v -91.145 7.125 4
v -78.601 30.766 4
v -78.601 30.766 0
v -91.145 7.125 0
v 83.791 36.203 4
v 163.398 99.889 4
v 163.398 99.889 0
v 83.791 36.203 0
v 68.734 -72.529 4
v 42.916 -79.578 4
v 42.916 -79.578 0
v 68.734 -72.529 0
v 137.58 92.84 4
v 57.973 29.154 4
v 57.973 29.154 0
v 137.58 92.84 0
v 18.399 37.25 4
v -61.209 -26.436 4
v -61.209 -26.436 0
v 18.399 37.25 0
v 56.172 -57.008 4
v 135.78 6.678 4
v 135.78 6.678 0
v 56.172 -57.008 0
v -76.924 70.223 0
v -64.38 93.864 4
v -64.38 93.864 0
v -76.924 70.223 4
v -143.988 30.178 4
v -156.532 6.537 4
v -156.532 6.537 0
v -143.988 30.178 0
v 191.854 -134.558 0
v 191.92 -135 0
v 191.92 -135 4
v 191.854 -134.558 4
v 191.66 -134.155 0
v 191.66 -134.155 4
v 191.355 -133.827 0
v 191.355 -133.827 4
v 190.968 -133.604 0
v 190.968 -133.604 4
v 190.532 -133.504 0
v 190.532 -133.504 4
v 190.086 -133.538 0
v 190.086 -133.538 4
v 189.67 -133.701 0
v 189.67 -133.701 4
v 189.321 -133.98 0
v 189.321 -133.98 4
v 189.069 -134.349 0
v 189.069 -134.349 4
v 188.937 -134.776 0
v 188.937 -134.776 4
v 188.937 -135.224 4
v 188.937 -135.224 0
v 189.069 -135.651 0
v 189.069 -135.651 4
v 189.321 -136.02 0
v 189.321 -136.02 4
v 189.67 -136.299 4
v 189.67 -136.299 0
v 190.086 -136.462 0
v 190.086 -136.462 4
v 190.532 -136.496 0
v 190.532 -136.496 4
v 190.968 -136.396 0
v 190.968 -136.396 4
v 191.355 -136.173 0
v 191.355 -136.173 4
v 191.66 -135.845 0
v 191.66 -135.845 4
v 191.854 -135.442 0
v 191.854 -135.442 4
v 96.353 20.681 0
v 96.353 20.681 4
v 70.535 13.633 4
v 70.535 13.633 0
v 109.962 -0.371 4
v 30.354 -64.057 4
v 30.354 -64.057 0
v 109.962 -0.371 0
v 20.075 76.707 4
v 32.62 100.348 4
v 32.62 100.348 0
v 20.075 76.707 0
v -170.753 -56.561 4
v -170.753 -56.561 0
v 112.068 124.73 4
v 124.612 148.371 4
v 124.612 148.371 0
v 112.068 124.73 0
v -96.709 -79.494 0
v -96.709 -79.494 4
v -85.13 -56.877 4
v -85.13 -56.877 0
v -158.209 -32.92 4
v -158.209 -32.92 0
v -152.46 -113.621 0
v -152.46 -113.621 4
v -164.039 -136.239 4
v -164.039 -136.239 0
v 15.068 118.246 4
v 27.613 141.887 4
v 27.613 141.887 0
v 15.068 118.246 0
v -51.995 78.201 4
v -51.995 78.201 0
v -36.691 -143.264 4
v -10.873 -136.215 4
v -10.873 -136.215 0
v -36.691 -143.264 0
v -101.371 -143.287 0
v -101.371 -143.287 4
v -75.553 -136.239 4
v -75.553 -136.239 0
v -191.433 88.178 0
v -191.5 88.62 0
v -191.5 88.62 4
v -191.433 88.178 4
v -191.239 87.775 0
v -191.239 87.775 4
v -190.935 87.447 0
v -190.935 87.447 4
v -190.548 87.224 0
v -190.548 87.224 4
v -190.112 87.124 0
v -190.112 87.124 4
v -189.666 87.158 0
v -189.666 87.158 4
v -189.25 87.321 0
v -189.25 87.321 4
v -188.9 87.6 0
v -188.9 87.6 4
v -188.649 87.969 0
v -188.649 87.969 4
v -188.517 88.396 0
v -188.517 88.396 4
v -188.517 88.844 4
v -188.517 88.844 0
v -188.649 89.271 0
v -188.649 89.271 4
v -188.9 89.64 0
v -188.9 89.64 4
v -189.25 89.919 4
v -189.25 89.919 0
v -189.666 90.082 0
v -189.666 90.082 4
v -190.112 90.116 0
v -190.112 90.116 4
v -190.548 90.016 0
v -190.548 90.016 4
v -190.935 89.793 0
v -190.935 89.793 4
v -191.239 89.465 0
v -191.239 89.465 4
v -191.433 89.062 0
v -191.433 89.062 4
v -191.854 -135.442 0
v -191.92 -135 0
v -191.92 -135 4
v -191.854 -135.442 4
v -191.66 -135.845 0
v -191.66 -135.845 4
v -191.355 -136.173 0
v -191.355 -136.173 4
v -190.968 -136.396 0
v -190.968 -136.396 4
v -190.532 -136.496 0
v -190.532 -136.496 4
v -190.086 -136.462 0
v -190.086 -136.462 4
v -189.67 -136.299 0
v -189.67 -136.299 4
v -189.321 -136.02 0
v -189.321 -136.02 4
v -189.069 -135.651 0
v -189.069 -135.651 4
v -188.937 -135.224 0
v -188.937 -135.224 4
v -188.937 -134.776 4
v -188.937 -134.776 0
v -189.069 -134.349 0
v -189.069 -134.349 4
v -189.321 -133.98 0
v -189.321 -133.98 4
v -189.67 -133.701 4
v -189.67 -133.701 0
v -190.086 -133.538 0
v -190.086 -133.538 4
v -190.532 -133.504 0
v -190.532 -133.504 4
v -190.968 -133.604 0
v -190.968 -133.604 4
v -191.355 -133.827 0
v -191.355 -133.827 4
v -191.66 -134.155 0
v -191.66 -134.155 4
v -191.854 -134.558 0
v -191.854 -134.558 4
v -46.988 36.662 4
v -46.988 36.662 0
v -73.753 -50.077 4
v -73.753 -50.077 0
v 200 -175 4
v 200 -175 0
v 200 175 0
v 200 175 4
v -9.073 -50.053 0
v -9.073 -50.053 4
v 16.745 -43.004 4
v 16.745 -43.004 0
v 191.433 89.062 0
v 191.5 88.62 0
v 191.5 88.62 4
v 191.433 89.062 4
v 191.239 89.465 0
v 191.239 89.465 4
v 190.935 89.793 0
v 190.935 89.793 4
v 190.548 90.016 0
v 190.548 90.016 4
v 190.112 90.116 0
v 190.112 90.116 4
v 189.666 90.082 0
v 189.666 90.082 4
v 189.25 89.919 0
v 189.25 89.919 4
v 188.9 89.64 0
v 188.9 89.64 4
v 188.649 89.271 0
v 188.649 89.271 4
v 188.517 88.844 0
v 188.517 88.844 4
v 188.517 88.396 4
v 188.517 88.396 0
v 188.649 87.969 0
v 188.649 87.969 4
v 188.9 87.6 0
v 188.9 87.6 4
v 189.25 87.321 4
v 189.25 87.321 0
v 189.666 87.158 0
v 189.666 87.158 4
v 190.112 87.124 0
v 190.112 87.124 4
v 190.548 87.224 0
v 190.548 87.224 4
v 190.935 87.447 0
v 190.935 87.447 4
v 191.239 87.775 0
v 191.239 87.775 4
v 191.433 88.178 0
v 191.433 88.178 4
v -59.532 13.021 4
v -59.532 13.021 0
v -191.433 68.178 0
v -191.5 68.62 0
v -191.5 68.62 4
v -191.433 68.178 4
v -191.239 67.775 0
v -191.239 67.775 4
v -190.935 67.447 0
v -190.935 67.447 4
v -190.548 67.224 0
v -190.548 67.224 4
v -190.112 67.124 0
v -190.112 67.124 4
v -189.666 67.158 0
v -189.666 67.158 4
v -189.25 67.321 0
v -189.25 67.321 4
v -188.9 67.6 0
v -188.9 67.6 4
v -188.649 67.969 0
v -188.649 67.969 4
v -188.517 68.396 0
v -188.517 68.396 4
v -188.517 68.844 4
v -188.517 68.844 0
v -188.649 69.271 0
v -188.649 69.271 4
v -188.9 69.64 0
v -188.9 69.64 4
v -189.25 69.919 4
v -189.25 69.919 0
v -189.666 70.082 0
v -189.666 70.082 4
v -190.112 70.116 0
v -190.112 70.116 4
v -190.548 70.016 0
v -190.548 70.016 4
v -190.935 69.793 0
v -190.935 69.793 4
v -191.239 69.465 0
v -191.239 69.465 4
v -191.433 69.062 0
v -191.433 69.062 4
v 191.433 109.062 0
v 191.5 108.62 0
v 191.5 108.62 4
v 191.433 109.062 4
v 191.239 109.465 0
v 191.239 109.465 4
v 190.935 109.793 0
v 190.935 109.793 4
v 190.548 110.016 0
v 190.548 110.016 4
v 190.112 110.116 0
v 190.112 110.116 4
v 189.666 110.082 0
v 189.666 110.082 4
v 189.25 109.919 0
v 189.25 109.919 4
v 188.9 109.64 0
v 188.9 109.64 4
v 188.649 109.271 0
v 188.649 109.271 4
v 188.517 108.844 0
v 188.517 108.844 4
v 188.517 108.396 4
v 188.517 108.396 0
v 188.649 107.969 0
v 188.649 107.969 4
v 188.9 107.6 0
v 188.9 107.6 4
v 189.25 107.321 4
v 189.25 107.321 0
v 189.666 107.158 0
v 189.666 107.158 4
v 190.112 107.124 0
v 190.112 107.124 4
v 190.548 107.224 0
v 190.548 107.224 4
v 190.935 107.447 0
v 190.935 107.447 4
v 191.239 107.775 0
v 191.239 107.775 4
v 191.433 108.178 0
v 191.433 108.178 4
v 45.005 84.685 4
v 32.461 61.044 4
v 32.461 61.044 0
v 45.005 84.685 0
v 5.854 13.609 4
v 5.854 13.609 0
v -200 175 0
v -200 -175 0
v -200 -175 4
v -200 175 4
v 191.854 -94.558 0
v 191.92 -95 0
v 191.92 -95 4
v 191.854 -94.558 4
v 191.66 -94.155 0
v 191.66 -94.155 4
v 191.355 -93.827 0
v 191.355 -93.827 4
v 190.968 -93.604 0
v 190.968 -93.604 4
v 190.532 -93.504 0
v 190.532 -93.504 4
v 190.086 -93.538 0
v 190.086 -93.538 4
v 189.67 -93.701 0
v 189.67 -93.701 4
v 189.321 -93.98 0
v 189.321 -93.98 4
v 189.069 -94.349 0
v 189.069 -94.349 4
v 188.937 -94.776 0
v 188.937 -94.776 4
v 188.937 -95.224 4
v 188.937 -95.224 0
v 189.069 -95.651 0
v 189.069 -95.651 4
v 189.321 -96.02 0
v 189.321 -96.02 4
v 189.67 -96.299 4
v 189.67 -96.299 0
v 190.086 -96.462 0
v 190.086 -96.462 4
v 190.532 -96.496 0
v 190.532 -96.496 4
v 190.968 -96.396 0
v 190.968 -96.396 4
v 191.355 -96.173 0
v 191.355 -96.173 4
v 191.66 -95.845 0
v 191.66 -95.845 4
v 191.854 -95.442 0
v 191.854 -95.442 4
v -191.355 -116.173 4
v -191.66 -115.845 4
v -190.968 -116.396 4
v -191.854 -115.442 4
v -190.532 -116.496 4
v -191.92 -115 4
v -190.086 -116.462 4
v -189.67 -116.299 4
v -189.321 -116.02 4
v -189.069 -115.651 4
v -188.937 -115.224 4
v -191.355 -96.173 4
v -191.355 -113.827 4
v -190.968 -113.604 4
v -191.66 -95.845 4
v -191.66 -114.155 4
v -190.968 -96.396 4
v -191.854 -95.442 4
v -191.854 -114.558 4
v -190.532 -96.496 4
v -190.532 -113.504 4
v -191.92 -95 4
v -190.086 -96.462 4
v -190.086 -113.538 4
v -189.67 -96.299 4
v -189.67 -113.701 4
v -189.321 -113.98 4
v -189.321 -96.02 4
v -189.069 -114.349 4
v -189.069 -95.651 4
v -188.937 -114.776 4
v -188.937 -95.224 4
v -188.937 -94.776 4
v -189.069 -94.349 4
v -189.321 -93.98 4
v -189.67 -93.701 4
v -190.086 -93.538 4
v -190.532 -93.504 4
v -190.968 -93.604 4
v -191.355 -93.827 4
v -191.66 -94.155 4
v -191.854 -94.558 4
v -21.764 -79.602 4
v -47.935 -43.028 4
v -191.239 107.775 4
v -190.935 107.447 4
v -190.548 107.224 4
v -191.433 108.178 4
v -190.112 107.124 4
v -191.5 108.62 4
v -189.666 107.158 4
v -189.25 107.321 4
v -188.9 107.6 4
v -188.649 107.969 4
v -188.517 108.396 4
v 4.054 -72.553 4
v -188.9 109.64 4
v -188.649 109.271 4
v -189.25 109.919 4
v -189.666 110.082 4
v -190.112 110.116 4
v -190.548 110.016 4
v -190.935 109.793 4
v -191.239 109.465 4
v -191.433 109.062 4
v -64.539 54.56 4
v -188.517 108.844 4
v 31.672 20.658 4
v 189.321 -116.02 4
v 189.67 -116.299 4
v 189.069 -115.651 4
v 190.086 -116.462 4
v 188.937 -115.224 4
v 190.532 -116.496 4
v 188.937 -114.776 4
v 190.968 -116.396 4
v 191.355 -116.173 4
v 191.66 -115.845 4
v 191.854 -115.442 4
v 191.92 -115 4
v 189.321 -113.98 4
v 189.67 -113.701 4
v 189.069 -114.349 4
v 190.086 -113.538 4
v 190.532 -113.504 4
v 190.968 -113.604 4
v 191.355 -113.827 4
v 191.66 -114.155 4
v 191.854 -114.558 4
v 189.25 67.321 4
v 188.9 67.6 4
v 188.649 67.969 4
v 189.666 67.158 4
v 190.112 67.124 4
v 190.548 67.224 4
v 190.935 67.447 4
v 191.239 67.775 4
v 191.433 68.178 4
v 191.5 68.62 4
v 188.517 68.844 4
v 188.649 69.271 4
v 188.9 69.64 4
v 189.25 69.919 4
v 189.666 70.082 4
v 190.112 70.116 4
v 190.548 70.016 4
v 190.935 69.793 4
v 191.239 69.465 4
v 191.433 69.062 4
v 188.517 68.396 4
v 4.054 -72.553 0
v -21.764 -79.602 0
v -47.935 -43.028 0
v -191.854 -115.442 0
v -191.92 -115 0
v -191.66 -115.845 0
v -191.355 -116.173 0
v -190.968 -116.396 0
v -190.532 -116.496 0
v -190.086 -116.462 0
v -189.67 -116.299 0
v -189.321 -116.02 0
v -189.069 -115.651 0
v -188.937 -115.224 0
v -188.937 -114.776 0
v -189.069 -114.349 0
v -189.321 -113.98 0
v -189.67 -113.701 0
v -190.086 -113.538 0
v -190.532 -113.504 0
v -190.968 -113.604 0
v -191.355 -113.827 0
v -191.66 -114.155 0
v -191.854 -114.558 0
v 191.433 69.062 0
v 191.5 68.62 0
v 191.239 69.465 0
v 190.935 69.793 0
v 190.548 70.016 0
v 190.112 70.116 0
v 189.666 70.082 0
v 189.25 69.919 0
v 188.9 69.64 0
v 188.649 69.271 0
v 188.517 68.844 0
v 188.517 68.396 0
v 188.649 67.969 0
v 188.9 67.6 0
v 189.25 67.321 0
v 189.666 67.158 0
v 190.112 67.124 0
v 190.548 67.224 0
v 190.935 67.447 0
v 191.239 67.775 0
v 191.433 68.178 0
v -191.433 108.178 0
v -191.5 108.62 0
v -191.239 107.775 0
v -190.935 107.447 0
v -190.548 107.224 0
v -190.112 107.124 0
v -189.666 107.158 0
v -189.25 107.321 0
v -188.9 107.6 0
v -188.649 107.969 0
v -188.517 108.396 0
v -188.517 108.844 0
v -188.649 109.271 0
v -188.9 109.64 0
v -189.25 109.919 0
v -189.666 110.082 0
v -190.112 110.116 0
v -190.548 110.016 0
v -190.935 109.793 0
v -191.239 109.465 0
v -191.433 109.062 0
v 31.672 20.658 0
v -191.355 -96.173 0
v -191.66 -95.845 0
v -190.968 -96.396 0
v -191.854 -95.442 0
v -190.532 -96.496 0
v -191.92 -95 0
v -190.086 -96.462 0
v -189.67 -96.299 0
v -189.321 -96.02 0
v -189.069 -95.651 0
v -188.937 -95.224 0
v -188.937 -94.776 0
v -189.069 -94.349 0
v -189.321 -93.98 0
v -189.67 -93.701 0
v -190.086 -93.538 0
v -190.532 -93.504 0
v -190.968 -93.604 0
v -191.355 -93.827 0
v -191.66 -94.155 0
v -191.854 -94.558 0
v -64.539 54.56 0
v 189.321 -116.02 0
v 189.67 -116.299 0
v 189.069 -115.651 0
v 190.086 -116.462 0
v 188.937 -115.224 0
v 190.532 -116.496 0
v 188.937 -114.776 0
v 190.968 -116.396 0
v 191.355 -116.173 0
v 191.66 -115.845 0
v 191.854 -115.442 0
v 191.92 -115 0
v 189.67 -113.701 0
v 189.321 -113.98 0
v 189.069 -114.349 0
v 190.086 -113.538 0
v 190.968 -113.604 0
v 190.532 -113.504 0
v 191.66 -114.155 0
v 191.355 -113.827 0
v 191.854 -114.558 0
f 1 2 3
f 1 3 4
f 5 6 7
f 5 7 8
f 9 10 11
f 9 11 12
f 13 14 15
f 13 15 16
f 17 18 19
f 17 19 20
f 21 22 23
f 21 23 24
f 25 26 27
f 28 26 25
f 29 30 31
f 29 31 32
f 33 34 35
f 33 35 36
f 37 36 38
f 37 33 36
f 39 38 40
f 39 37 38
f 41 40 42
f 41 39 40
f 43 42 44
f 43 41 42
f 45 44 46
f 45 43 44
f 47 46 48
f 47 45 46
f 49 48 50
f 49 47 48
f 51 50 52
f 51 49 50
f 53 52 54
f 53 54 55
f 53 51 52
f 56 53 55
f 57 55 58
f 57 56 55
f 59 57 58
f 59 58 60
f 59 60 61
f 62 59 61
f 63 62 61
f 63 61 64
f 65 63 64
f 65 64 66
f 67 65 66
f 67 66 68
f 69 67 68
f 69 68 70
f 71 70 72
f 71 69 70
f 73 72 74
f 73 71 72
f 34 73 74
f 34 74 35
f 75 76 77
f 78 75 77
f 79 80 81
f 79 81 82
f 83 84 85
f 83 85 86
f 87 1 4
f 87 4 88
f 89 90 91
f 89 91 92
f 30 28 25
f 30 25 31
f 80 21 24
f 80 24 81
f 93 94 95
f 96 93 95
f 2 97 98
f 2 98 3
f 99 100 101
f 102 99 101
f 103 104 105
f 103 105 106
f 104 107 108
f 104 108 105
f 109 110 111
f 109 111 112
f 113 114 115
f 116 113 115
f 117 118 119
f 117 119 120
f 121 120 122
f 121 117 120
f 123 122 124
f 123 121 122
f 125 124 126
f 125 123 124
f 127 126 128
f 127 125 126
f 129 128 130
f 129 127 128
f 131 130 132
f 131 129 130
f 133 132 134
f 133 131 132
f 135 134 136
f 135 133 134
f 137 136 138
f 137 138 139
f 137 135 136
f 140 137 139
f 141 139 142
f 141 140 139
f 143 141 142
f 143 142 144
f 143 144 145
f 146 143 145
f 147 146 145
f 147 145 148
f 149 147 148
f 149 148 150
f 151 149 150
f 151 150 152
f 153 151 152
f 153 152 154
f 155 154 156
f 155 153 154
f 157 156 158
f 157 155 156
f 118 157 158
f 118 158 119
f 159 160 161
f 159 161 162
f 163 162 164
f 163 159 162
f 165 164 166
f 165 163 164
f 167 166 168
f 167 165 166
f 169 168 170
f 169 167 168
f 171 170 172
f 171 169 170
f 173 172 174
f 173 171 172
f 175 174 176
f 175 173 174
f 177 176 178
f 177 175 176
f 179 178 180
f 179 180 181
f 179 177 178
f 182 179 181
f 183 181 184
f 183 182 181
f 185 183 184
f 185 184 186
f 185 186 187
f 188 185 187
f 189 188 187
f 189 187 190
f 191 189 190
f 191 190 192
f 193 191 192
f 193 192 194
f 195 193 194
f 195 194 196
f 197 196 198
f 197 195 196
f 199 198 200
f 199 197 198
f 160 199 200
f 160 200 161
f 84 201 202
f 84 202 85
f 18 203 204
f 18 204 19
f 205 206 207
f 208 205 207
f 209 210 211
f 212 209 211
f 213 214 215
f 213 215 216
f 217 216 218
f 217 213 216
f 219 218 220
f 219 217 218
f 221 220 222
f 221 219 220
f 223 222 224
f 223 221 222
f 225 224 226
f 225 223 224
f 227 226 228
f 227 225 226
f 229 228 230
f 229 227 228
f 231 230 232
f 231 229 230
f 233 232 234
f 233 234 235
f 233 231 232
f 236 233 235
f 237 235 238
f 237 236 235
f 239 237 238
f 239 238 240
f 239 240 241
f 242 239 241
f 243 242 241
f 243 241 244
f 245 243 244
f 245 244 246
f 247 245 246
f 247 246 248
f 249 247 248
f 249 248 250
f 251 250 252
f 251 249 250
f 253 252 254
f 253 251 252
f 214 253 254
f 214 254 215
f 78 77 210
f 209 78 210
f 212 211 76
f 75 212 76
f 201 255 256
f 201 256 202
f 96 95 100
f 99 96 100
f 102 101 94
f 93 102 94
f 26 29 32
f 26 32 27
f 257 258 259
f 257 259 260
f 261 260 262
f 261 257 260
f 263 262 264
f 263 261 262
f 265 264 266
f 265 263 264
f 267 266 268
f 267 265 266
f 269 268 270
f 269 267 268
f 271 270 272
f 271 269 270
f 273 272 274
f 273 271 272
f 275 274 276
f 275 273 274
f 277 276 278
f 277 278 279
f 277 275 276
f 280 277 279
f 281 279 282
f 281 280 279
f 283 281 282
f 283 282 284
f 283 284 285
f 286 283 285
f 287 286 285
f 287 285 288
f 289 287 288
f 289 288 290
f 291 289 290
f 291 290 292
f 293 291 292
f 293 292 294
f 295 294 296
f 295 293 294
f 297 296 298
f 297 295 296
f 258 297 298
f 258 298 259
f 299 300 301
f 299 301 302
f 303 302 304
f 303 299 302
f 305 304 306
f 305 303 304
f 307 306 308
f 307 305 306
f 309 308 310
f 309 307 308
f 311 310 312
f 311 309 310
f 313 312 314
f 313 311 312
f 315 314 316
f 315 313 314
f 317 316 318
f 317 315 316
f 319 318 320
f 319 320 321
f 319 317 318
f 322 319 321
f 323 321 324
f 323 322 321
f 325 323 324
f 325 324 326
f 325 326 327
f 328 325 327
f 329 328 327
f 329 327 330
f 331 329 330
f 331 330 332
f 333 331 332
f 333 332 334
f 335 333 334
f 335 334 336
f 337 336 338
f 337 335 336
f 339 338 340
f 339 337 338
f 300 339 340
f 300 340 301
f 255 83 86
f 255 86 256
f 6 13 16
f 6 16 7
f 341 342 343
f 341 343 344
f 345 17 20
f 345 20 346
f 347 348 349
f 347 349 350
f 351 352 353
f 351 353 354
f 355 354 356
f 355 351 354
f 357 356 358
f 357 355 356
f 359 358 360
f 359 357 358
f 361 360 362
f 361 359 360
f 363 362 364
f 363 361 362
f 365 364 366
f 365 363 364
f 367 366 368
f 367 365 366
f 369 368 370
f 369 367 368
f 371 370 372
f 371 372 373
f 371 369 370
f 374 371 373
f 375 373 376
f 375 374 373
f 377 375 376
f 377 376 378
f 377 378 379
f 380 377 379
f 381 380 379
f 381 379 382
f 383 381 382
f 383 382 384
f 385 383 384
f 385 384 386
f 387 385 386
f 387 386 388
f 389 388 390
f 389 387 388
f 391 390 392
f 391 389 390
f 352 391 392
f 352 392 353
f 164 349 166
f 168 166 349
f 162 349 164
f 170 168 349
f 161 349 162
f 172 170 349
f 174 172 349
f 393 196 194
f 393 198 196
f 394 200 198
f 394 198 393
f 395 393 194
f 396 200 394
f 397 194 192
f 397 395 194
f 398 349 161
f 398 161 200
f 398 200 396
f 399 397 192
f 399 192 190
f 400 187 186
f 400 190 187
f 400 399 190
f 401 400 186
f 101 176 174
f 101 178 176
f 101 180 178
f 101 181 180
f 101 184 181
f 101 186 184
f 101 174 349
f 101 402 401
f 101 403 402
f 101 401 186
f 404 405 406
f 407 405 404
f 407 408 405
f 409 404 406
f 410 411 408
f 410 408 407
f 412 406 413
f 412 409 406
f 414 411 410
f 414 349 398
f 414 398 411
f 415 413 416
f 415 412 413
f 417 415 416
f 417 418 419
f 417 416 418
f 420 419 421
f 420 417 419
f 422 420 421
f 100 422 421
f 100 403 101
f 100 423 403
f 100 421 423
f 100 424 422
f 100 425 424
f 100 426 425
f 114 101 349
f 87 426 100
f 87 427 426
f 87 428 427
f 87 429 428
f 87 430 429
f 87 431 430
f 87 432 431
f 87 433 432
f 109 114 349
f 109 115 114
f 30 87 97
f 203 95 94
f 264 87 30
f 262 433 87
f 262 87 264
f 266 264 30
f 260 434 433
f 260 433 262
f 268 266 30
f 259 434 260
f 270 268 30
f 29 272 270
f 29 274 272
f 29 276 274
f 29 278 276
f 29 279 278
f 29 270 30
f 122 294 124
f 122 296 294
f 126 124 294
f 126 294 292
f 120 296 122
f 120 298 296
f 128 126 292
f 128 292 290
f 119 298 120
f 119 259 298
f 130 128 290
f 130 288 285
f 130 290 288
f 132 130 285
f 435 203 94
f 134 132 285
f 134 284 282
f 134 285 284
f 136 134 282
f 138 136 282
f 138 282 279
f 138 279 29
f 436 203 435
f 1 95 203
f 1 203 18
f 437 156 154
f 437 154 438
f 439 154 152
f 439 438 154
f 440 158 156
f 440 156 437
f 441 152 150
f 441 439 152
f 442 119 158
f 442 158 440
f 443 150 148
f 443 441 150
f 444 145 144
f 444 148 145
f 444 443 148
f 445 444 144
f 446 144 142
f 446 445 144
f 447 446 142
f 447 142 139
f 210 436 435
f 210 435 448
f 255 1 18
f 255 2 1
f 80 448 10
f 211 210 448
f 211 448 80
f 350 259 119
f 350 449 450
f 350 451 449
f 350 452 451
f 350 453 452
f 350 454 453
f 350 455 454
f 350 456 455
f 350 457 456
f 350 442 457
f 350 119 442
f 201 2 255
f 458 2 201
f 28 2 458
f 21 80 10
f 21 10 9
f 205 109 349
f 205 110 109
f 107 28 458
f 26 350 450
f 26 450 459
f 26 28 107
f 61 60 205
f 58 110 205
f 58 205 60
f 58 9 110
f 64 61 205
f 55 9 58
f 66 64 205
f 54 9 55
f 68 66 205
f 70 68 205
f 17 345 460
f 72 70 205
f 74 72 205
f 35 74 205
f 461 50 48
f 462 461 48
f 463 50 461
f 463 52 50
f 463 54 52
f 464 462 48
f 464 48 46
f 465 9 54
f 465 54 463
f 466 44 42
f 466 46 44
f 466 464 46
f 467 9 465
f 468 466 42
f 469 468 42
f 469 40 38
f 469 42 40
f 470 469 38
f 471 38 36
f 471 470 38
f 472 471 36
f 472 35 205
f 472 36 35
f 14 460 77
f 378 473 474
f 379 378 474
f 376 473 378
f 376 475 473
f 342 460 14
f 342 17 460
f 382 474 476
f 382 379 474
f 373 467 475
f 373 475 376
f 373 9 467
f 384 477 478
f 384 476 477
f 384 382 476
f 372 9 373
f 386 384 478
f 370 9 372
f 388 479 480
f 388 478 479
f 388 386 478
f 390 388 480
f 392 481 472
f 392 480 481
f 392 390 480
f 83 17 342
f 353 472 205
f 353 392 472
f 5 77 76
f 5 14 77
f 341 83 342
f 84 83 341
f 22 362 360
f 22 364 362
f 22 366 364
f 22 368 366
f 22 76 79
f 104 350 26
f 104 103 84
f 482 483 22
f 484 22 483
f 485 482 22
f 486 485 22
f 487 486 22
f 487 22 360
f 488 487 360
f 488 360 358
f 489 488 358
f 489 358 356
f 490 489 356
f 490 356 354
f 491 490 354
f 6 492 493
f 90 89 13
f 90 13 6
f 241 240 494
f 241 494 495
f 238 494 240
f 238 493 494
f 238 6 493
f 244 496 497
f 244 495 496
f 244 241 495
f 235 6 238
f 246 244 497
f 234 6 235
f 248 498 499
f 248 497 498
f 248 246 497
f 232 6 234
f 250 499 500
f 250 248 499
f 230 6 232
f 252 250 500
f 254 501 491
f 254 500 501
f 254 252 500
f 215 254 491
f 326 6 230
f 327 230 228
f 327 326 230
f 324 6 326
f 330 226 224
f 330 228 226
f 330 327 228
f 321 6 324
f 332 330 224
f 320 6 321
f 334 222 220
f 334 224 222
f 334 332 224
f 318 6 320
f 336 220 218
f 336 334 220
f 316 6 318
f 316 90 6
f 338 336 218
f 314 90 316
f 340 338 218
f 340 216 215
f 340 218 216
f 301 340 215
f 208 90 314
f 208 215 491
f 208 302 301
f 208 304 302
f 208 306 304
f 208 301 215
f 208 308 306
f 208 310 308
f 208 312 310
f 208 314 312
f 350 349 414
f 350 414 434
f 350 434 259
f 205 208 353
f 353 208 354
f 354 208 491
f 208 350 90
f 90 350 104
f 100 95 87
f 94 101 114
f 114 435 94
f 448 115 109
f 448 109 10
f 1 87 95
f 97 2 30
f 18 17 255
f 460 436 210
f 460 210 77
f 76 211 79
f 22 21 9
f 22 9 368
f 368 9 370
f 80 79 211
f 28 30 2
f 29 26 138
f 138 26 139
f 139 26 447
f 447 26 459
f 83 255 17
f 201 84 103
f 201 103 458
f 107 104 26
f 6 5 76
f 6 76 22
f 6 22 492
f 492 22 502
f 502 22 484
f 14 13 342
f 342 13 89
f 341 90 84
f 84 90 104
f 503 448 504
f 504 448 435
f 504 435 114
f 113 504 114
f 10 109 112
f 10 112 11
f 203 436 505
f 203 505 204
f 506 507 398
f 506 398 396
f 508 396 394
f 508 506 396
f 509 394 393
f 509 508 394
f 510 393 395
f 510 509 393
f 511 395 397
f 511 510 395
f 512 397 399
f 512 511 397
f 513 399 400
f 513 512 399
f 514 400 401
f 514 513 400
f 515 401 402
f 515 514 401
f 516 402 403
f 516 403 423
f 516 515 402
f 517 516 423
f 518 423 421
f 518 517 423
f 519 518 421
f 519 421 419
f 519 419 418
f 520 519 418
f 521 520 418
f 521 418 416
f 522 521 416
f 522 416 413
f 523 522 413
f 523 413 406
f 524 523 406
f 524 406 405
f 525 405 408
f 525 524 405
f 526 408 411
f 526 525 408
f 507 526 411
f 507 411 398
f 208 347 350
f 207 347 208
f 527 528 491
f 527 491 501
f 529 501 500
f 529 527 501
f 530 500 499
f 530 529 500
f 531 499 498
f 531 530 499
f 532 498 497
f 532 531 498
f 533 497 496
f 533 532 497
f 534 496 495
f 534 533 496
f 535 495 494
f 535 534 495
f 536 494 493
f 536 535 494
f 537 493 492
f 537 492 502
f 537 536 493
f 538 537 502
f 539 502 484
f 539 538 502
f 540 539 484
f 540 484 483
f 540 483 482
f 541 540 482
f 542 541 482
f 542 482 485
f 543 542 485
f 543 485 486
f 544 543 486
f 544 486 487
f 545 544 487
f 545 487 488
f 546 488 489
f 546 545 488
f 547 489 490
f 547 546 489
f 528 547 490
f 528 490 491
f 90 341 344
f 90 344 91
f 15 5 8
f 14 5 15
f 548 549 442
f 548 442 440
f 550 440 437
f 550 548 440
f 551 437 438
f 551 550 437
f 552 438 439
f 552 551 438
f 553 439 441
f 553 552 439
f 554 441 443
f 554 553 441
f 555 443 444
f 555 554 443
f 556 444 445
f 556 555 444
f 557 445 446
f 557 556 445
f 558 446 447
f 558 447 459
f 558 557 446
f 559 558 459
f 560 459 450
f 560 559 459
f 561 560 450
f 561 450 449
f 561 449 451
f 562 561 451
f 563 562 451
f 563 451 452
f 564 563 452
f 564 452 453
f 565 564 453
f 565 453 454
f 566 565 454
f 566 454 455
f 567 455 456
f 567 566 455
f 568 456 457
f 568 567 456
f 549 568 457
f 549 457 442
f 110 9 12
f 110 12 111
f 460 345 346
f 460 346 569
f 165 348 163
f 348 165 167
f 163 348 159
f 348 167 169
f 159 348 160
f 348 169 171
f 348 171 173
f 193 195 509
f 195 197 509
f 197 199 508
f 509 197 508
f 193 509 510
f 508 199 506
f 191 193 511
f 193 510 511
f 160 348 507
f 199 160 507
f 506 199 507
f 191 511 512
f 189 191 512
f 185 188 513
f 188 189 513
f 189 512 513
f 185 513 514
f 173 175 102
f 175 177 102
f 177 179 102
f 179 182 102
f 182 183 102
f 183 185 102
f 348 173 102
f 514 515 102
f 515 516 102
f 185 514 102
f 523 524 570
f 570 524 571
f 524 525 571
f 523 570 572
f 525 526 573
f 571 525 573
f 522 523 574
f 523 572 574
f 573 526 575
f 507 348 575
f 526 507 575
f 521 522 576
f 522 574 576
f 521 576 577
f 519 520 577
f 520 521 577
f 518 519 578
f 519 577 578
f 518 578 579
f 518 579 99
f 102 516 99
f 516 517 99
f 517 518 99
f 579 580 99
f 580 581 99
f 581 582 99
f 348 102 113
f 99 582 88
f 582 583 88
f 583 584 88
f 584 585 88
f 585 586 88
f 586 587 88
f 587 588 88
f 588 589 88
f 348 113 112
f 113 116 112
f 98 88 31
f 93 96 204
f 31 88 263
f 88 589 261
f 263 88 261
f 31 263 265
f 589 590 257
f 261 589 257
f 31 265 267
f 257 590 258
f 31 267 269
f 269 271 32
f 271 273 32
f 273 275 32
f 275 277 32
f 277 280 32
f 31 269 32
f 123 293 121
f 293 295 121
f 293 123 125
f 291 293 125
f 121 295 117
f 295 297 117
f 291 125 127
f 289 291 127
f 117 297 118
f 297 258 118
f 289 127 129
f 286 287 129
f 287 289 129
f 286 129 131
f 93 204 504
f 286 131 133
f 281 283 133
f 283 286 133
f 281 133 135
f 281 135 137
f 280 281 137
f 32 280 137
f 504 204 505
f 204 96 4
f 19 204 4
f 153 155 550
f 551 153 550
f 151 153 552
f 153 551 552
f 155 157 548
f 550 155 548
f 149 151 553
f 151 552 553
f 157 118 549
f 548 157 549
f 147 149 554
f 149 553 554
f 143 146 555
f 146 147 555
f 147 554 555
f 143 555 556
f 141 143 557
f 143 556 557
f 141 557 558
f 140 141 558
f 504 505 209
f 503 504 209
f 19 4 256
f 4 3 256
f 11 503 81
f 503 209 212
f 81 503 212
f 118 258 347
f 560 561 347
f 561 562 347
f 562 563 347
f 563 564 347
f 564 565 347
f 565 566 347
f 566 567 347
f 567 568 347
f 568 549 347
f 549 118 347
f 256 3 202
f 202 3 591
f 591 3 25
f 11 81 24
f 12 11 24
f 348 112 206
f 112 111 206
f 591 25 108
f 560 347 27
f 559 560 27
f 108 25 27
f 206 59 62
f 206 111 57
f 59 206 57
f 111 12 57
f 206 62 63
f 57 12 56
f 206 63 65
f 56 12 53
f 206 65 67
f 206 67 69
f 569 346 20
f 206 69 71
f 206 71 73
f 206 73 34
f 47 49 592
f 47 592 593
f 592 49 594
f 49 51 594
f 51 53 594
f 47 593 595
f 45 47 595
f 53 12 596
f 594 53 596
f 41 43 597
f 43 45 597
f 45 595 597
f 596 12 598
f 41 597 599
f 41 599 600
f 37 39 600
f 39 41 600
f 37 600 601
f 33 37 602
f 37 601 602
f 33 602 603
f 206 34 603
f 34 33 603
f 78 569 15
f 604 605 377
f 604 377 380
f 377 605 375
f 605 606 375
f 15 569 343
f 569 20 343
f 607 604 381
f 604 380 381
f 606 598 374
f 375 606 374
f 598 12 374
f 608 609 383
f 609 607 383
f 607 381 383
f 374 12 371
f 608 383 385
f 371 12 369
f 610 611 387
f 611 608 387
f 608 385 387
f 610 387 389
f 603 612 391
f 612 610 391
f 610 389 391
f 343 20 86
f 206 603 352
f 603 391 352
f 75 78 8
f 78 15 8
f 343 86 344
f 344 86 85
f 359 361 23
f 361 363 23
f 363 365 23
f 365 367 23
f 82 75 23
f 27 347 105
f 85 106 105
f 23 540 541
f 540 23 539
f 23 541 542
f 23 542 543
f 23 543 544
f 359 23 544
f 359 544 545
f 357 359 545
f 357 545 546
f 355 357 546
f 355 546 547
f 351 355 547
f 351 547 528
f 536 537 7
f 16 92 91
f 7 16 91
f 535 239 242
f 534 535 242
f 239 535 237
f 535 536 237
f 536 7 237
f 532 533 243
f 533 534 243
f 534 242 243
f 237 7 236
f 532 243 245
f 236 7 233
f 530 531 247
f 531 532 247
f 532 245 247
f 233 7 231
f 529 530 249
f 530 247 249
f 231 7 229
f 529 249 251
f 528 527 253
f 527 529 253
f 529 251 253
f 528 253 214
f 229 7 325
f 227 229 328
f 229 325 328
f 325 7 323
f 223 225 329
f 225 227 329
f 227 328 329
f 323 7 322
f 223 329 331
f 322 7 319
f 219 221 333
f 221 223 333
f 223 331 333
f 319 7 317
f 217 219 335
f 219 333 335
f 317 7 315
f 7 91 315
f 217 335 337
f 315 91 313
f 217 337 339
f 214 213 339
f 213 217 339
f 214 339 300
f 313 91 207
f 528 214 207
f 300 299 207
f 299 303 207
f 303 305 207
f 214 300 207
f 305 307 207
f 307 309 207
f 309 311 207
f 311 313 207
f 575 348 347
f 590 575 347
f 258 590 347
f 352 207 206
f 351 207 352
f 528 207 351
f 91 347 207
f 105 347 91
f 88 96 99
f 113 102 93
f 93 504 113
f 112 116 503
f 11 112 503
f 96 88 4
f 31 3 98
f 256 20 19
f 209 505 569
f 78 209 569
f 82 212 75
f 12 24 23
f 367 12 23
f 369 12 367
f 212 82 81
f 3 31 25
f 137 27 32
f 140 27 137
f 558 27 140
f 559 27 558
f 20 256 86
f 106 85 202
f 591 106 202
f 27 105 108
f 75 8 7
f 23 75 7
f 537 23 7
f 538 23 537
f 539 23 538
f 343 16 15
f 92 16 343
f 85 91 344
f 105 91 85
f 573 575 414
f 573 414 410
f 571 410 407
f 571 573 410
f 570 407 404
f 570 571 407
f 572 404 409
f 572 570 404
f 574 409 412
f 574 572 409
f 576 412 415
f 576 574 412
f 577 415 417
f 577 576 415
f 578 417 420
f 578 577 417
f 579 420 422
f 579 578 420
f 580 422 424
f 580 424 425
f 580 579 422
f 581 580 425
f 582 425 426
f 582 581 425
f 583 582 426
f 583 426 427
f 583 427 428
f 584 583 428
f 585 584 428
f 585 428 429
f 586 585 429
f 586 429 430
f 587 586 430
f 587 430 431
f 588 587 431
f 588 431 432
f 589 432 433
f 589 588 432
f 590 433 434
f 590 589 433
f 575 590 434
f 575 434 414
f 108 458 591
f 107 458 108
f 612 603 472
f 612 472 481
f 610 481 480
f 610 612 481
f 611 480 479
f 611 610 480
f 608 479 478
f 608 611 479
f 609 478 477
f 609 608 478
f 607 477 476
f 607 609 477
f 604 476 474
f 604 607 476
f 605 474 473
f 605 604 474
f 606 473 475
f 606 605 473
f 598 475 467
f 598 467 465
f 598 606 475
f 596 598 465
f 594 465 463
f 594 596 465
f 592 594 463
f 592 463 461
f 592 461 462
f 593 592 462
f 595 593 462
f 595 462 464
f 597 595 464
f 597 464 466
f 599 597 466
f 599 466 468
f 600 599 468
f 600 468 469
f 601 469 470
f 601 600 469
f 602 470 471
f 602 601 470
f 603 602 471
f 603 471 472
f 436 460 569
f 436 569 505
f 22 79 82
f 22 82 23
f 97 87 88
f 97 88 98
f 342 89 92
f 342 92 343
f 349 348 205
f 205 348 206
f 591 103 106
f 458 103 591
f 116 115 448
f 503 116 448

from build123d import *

# Parameters (mm, degrees)
SKETCH1_W           = 400
SKETCH1_H           = 350
SKETCH1_R           = 1.5
BOSS_EXTRUDE1_DEPTH = 4
CUT_EXTRUDE1_DEPTH  = 10


with BuildPart() as part:
    # Sketch1 → Boss-Extrude1 (new body)
    with BuildSketch(Plane.XY):
        Rectangle(SKETCH1_W, SKETCH1_H)
        with Locations((190.420210886, -135)):
            Circle(SKETCH1_R, mode=Mode.SUBTRACT)
        with Locations((190.420210886, -115)):
            Circle(SKETCH1_R, mode=Mode.SUBTRACT)
        with Locations((190.420210886, -95)):
            Circle(SKETCH1_R, mode=Mode.SUBTRACT)
        with Locations((190, 68.62)):
            Circle(SKETCH1_R, mode=Mode.SUBTRACT)
        with Locations((190, 88.62)):
            Circle(SKETCH1_R, mode=Mode.SUBTRACT)
        with Locations((190, 108.62)):
            Circle(SKETCH1_R, mode=Mode.SUBTRACT)
        with Locations(Location((-190.420210886, -135, 0), (0, 0, 180))):
            Circle(SKETCH1_R, mode=Mode.SUBTRACT)
        with Locations(Location((-190.420210886, -95, 0), (0, 0, 180))):
            Circle(SKETCH1_R, mode=Mode.SUBTRACT)
        with Locations(Location((-190.420210886, -115, 0), (0, 0, 180))):
            Circle(SKETCH1_R, mode=Mode.SUBTRACT)
        with Locations(Location((-190, 68.62, 0), (0, 0, 180))):
            Circle(SKETCH1_R, mode=Mode.SUBTRACT)
        with Locations(Location((-190, 88.62, 0), (0, 0, 180))):
            Circle(SKETCH1_R, mode=Mode.SUBTRACT)
        with Locations(Location((-190, 108.62, 0), (0, 0, 180))):
            Circle(SKETCH1_R, mode=Mode.SUBTRACT)
    extrude(amount=BOSS_EXTRUDE1_DEPTH)

    # Sketch2 → Cut-Extrude1 (cut)
    with BuildSketch(Plane.XY.offset(4)):
        Polygon((-76.924392285, 70.222779709), (-156.531783107, 6.536867051), (-143.98758819, 30.17784978), (-64.380197367, 93.863762438), align=None)
        Polygon((15.0683317, 118.246100027), (-64.539059123, 54.560187369), (-51.994864205, 78.201170098), (27.612526617, 141.887082756), align=None)
        Polygon((20.075418883, 76.706692842), (-59.53197194, 13.020780184), (-46.987777022, 36.661762913), (32.6196138, 100.347675571), align=None)
        Polygon((112.068142867, 124.730013159), (32.460752045, 61.044100501), (45.004946962, 84.685083231), (124.612337785, 148.370995889), align=None)
        Polygon((163.398141207, 99.888741611), (83.790750385, 36.202828953), (57.972773228, 29.154074023), (137.580164051, 92.839986681), align=None)
        Polygon((5.854349879, 13.609157056), (-73.753040943, -50.076755602), (-61.208846026, -26.435772873), (18.398544797, 37.250139785), align=None)
        Polygon((31.672327036, 20.657911987), (-47.935063786, -43.028000671), (-73.753040943, -50.076755602), (5.854349879, 13.609157056), align=None)
        Polygon((135.779730821, 6.678077501), (56.172339999, -57.007835157), (30.354362842, -64.056590088), (109.961753665, -0.37067743), align=None)
        Polygon((68.734186222, -72.529217049), (-10.8732046, -136.215129707), (-36.691181757, -143.263884637), (42.916209066, -79.577971979), align=None)
        Polygon((-91.145461288, 7.125243924), (-170.752852111, -56.560668734), (-158.208657193, -32.919686005), (-78.601266371, 30.766226653), align=None)
        Polygon((70.534619452, 13.632692131), (-9.072771371, -50.053220527), (16.745205786, -43.004465597), (96.352596608, 20.681447061), align=None)
        Polygon((-21.764060506, -79.601507054), (-101.371451329, -143.287419712), (-75.553474172, -136.238664782), (4.05391665, -72.552752124), align=None)
        Polygon((-85.129533688, -56.876544129), (-152.460215151, -113.62145781), (-164.039471998, -136.238664782), (-96.708790535, -79.493751101), align=None)
    extrude(amount=-CUT_EXTRUDE1_DEPTH, mode=Mode.SUBTRACT)


solid = part.part
